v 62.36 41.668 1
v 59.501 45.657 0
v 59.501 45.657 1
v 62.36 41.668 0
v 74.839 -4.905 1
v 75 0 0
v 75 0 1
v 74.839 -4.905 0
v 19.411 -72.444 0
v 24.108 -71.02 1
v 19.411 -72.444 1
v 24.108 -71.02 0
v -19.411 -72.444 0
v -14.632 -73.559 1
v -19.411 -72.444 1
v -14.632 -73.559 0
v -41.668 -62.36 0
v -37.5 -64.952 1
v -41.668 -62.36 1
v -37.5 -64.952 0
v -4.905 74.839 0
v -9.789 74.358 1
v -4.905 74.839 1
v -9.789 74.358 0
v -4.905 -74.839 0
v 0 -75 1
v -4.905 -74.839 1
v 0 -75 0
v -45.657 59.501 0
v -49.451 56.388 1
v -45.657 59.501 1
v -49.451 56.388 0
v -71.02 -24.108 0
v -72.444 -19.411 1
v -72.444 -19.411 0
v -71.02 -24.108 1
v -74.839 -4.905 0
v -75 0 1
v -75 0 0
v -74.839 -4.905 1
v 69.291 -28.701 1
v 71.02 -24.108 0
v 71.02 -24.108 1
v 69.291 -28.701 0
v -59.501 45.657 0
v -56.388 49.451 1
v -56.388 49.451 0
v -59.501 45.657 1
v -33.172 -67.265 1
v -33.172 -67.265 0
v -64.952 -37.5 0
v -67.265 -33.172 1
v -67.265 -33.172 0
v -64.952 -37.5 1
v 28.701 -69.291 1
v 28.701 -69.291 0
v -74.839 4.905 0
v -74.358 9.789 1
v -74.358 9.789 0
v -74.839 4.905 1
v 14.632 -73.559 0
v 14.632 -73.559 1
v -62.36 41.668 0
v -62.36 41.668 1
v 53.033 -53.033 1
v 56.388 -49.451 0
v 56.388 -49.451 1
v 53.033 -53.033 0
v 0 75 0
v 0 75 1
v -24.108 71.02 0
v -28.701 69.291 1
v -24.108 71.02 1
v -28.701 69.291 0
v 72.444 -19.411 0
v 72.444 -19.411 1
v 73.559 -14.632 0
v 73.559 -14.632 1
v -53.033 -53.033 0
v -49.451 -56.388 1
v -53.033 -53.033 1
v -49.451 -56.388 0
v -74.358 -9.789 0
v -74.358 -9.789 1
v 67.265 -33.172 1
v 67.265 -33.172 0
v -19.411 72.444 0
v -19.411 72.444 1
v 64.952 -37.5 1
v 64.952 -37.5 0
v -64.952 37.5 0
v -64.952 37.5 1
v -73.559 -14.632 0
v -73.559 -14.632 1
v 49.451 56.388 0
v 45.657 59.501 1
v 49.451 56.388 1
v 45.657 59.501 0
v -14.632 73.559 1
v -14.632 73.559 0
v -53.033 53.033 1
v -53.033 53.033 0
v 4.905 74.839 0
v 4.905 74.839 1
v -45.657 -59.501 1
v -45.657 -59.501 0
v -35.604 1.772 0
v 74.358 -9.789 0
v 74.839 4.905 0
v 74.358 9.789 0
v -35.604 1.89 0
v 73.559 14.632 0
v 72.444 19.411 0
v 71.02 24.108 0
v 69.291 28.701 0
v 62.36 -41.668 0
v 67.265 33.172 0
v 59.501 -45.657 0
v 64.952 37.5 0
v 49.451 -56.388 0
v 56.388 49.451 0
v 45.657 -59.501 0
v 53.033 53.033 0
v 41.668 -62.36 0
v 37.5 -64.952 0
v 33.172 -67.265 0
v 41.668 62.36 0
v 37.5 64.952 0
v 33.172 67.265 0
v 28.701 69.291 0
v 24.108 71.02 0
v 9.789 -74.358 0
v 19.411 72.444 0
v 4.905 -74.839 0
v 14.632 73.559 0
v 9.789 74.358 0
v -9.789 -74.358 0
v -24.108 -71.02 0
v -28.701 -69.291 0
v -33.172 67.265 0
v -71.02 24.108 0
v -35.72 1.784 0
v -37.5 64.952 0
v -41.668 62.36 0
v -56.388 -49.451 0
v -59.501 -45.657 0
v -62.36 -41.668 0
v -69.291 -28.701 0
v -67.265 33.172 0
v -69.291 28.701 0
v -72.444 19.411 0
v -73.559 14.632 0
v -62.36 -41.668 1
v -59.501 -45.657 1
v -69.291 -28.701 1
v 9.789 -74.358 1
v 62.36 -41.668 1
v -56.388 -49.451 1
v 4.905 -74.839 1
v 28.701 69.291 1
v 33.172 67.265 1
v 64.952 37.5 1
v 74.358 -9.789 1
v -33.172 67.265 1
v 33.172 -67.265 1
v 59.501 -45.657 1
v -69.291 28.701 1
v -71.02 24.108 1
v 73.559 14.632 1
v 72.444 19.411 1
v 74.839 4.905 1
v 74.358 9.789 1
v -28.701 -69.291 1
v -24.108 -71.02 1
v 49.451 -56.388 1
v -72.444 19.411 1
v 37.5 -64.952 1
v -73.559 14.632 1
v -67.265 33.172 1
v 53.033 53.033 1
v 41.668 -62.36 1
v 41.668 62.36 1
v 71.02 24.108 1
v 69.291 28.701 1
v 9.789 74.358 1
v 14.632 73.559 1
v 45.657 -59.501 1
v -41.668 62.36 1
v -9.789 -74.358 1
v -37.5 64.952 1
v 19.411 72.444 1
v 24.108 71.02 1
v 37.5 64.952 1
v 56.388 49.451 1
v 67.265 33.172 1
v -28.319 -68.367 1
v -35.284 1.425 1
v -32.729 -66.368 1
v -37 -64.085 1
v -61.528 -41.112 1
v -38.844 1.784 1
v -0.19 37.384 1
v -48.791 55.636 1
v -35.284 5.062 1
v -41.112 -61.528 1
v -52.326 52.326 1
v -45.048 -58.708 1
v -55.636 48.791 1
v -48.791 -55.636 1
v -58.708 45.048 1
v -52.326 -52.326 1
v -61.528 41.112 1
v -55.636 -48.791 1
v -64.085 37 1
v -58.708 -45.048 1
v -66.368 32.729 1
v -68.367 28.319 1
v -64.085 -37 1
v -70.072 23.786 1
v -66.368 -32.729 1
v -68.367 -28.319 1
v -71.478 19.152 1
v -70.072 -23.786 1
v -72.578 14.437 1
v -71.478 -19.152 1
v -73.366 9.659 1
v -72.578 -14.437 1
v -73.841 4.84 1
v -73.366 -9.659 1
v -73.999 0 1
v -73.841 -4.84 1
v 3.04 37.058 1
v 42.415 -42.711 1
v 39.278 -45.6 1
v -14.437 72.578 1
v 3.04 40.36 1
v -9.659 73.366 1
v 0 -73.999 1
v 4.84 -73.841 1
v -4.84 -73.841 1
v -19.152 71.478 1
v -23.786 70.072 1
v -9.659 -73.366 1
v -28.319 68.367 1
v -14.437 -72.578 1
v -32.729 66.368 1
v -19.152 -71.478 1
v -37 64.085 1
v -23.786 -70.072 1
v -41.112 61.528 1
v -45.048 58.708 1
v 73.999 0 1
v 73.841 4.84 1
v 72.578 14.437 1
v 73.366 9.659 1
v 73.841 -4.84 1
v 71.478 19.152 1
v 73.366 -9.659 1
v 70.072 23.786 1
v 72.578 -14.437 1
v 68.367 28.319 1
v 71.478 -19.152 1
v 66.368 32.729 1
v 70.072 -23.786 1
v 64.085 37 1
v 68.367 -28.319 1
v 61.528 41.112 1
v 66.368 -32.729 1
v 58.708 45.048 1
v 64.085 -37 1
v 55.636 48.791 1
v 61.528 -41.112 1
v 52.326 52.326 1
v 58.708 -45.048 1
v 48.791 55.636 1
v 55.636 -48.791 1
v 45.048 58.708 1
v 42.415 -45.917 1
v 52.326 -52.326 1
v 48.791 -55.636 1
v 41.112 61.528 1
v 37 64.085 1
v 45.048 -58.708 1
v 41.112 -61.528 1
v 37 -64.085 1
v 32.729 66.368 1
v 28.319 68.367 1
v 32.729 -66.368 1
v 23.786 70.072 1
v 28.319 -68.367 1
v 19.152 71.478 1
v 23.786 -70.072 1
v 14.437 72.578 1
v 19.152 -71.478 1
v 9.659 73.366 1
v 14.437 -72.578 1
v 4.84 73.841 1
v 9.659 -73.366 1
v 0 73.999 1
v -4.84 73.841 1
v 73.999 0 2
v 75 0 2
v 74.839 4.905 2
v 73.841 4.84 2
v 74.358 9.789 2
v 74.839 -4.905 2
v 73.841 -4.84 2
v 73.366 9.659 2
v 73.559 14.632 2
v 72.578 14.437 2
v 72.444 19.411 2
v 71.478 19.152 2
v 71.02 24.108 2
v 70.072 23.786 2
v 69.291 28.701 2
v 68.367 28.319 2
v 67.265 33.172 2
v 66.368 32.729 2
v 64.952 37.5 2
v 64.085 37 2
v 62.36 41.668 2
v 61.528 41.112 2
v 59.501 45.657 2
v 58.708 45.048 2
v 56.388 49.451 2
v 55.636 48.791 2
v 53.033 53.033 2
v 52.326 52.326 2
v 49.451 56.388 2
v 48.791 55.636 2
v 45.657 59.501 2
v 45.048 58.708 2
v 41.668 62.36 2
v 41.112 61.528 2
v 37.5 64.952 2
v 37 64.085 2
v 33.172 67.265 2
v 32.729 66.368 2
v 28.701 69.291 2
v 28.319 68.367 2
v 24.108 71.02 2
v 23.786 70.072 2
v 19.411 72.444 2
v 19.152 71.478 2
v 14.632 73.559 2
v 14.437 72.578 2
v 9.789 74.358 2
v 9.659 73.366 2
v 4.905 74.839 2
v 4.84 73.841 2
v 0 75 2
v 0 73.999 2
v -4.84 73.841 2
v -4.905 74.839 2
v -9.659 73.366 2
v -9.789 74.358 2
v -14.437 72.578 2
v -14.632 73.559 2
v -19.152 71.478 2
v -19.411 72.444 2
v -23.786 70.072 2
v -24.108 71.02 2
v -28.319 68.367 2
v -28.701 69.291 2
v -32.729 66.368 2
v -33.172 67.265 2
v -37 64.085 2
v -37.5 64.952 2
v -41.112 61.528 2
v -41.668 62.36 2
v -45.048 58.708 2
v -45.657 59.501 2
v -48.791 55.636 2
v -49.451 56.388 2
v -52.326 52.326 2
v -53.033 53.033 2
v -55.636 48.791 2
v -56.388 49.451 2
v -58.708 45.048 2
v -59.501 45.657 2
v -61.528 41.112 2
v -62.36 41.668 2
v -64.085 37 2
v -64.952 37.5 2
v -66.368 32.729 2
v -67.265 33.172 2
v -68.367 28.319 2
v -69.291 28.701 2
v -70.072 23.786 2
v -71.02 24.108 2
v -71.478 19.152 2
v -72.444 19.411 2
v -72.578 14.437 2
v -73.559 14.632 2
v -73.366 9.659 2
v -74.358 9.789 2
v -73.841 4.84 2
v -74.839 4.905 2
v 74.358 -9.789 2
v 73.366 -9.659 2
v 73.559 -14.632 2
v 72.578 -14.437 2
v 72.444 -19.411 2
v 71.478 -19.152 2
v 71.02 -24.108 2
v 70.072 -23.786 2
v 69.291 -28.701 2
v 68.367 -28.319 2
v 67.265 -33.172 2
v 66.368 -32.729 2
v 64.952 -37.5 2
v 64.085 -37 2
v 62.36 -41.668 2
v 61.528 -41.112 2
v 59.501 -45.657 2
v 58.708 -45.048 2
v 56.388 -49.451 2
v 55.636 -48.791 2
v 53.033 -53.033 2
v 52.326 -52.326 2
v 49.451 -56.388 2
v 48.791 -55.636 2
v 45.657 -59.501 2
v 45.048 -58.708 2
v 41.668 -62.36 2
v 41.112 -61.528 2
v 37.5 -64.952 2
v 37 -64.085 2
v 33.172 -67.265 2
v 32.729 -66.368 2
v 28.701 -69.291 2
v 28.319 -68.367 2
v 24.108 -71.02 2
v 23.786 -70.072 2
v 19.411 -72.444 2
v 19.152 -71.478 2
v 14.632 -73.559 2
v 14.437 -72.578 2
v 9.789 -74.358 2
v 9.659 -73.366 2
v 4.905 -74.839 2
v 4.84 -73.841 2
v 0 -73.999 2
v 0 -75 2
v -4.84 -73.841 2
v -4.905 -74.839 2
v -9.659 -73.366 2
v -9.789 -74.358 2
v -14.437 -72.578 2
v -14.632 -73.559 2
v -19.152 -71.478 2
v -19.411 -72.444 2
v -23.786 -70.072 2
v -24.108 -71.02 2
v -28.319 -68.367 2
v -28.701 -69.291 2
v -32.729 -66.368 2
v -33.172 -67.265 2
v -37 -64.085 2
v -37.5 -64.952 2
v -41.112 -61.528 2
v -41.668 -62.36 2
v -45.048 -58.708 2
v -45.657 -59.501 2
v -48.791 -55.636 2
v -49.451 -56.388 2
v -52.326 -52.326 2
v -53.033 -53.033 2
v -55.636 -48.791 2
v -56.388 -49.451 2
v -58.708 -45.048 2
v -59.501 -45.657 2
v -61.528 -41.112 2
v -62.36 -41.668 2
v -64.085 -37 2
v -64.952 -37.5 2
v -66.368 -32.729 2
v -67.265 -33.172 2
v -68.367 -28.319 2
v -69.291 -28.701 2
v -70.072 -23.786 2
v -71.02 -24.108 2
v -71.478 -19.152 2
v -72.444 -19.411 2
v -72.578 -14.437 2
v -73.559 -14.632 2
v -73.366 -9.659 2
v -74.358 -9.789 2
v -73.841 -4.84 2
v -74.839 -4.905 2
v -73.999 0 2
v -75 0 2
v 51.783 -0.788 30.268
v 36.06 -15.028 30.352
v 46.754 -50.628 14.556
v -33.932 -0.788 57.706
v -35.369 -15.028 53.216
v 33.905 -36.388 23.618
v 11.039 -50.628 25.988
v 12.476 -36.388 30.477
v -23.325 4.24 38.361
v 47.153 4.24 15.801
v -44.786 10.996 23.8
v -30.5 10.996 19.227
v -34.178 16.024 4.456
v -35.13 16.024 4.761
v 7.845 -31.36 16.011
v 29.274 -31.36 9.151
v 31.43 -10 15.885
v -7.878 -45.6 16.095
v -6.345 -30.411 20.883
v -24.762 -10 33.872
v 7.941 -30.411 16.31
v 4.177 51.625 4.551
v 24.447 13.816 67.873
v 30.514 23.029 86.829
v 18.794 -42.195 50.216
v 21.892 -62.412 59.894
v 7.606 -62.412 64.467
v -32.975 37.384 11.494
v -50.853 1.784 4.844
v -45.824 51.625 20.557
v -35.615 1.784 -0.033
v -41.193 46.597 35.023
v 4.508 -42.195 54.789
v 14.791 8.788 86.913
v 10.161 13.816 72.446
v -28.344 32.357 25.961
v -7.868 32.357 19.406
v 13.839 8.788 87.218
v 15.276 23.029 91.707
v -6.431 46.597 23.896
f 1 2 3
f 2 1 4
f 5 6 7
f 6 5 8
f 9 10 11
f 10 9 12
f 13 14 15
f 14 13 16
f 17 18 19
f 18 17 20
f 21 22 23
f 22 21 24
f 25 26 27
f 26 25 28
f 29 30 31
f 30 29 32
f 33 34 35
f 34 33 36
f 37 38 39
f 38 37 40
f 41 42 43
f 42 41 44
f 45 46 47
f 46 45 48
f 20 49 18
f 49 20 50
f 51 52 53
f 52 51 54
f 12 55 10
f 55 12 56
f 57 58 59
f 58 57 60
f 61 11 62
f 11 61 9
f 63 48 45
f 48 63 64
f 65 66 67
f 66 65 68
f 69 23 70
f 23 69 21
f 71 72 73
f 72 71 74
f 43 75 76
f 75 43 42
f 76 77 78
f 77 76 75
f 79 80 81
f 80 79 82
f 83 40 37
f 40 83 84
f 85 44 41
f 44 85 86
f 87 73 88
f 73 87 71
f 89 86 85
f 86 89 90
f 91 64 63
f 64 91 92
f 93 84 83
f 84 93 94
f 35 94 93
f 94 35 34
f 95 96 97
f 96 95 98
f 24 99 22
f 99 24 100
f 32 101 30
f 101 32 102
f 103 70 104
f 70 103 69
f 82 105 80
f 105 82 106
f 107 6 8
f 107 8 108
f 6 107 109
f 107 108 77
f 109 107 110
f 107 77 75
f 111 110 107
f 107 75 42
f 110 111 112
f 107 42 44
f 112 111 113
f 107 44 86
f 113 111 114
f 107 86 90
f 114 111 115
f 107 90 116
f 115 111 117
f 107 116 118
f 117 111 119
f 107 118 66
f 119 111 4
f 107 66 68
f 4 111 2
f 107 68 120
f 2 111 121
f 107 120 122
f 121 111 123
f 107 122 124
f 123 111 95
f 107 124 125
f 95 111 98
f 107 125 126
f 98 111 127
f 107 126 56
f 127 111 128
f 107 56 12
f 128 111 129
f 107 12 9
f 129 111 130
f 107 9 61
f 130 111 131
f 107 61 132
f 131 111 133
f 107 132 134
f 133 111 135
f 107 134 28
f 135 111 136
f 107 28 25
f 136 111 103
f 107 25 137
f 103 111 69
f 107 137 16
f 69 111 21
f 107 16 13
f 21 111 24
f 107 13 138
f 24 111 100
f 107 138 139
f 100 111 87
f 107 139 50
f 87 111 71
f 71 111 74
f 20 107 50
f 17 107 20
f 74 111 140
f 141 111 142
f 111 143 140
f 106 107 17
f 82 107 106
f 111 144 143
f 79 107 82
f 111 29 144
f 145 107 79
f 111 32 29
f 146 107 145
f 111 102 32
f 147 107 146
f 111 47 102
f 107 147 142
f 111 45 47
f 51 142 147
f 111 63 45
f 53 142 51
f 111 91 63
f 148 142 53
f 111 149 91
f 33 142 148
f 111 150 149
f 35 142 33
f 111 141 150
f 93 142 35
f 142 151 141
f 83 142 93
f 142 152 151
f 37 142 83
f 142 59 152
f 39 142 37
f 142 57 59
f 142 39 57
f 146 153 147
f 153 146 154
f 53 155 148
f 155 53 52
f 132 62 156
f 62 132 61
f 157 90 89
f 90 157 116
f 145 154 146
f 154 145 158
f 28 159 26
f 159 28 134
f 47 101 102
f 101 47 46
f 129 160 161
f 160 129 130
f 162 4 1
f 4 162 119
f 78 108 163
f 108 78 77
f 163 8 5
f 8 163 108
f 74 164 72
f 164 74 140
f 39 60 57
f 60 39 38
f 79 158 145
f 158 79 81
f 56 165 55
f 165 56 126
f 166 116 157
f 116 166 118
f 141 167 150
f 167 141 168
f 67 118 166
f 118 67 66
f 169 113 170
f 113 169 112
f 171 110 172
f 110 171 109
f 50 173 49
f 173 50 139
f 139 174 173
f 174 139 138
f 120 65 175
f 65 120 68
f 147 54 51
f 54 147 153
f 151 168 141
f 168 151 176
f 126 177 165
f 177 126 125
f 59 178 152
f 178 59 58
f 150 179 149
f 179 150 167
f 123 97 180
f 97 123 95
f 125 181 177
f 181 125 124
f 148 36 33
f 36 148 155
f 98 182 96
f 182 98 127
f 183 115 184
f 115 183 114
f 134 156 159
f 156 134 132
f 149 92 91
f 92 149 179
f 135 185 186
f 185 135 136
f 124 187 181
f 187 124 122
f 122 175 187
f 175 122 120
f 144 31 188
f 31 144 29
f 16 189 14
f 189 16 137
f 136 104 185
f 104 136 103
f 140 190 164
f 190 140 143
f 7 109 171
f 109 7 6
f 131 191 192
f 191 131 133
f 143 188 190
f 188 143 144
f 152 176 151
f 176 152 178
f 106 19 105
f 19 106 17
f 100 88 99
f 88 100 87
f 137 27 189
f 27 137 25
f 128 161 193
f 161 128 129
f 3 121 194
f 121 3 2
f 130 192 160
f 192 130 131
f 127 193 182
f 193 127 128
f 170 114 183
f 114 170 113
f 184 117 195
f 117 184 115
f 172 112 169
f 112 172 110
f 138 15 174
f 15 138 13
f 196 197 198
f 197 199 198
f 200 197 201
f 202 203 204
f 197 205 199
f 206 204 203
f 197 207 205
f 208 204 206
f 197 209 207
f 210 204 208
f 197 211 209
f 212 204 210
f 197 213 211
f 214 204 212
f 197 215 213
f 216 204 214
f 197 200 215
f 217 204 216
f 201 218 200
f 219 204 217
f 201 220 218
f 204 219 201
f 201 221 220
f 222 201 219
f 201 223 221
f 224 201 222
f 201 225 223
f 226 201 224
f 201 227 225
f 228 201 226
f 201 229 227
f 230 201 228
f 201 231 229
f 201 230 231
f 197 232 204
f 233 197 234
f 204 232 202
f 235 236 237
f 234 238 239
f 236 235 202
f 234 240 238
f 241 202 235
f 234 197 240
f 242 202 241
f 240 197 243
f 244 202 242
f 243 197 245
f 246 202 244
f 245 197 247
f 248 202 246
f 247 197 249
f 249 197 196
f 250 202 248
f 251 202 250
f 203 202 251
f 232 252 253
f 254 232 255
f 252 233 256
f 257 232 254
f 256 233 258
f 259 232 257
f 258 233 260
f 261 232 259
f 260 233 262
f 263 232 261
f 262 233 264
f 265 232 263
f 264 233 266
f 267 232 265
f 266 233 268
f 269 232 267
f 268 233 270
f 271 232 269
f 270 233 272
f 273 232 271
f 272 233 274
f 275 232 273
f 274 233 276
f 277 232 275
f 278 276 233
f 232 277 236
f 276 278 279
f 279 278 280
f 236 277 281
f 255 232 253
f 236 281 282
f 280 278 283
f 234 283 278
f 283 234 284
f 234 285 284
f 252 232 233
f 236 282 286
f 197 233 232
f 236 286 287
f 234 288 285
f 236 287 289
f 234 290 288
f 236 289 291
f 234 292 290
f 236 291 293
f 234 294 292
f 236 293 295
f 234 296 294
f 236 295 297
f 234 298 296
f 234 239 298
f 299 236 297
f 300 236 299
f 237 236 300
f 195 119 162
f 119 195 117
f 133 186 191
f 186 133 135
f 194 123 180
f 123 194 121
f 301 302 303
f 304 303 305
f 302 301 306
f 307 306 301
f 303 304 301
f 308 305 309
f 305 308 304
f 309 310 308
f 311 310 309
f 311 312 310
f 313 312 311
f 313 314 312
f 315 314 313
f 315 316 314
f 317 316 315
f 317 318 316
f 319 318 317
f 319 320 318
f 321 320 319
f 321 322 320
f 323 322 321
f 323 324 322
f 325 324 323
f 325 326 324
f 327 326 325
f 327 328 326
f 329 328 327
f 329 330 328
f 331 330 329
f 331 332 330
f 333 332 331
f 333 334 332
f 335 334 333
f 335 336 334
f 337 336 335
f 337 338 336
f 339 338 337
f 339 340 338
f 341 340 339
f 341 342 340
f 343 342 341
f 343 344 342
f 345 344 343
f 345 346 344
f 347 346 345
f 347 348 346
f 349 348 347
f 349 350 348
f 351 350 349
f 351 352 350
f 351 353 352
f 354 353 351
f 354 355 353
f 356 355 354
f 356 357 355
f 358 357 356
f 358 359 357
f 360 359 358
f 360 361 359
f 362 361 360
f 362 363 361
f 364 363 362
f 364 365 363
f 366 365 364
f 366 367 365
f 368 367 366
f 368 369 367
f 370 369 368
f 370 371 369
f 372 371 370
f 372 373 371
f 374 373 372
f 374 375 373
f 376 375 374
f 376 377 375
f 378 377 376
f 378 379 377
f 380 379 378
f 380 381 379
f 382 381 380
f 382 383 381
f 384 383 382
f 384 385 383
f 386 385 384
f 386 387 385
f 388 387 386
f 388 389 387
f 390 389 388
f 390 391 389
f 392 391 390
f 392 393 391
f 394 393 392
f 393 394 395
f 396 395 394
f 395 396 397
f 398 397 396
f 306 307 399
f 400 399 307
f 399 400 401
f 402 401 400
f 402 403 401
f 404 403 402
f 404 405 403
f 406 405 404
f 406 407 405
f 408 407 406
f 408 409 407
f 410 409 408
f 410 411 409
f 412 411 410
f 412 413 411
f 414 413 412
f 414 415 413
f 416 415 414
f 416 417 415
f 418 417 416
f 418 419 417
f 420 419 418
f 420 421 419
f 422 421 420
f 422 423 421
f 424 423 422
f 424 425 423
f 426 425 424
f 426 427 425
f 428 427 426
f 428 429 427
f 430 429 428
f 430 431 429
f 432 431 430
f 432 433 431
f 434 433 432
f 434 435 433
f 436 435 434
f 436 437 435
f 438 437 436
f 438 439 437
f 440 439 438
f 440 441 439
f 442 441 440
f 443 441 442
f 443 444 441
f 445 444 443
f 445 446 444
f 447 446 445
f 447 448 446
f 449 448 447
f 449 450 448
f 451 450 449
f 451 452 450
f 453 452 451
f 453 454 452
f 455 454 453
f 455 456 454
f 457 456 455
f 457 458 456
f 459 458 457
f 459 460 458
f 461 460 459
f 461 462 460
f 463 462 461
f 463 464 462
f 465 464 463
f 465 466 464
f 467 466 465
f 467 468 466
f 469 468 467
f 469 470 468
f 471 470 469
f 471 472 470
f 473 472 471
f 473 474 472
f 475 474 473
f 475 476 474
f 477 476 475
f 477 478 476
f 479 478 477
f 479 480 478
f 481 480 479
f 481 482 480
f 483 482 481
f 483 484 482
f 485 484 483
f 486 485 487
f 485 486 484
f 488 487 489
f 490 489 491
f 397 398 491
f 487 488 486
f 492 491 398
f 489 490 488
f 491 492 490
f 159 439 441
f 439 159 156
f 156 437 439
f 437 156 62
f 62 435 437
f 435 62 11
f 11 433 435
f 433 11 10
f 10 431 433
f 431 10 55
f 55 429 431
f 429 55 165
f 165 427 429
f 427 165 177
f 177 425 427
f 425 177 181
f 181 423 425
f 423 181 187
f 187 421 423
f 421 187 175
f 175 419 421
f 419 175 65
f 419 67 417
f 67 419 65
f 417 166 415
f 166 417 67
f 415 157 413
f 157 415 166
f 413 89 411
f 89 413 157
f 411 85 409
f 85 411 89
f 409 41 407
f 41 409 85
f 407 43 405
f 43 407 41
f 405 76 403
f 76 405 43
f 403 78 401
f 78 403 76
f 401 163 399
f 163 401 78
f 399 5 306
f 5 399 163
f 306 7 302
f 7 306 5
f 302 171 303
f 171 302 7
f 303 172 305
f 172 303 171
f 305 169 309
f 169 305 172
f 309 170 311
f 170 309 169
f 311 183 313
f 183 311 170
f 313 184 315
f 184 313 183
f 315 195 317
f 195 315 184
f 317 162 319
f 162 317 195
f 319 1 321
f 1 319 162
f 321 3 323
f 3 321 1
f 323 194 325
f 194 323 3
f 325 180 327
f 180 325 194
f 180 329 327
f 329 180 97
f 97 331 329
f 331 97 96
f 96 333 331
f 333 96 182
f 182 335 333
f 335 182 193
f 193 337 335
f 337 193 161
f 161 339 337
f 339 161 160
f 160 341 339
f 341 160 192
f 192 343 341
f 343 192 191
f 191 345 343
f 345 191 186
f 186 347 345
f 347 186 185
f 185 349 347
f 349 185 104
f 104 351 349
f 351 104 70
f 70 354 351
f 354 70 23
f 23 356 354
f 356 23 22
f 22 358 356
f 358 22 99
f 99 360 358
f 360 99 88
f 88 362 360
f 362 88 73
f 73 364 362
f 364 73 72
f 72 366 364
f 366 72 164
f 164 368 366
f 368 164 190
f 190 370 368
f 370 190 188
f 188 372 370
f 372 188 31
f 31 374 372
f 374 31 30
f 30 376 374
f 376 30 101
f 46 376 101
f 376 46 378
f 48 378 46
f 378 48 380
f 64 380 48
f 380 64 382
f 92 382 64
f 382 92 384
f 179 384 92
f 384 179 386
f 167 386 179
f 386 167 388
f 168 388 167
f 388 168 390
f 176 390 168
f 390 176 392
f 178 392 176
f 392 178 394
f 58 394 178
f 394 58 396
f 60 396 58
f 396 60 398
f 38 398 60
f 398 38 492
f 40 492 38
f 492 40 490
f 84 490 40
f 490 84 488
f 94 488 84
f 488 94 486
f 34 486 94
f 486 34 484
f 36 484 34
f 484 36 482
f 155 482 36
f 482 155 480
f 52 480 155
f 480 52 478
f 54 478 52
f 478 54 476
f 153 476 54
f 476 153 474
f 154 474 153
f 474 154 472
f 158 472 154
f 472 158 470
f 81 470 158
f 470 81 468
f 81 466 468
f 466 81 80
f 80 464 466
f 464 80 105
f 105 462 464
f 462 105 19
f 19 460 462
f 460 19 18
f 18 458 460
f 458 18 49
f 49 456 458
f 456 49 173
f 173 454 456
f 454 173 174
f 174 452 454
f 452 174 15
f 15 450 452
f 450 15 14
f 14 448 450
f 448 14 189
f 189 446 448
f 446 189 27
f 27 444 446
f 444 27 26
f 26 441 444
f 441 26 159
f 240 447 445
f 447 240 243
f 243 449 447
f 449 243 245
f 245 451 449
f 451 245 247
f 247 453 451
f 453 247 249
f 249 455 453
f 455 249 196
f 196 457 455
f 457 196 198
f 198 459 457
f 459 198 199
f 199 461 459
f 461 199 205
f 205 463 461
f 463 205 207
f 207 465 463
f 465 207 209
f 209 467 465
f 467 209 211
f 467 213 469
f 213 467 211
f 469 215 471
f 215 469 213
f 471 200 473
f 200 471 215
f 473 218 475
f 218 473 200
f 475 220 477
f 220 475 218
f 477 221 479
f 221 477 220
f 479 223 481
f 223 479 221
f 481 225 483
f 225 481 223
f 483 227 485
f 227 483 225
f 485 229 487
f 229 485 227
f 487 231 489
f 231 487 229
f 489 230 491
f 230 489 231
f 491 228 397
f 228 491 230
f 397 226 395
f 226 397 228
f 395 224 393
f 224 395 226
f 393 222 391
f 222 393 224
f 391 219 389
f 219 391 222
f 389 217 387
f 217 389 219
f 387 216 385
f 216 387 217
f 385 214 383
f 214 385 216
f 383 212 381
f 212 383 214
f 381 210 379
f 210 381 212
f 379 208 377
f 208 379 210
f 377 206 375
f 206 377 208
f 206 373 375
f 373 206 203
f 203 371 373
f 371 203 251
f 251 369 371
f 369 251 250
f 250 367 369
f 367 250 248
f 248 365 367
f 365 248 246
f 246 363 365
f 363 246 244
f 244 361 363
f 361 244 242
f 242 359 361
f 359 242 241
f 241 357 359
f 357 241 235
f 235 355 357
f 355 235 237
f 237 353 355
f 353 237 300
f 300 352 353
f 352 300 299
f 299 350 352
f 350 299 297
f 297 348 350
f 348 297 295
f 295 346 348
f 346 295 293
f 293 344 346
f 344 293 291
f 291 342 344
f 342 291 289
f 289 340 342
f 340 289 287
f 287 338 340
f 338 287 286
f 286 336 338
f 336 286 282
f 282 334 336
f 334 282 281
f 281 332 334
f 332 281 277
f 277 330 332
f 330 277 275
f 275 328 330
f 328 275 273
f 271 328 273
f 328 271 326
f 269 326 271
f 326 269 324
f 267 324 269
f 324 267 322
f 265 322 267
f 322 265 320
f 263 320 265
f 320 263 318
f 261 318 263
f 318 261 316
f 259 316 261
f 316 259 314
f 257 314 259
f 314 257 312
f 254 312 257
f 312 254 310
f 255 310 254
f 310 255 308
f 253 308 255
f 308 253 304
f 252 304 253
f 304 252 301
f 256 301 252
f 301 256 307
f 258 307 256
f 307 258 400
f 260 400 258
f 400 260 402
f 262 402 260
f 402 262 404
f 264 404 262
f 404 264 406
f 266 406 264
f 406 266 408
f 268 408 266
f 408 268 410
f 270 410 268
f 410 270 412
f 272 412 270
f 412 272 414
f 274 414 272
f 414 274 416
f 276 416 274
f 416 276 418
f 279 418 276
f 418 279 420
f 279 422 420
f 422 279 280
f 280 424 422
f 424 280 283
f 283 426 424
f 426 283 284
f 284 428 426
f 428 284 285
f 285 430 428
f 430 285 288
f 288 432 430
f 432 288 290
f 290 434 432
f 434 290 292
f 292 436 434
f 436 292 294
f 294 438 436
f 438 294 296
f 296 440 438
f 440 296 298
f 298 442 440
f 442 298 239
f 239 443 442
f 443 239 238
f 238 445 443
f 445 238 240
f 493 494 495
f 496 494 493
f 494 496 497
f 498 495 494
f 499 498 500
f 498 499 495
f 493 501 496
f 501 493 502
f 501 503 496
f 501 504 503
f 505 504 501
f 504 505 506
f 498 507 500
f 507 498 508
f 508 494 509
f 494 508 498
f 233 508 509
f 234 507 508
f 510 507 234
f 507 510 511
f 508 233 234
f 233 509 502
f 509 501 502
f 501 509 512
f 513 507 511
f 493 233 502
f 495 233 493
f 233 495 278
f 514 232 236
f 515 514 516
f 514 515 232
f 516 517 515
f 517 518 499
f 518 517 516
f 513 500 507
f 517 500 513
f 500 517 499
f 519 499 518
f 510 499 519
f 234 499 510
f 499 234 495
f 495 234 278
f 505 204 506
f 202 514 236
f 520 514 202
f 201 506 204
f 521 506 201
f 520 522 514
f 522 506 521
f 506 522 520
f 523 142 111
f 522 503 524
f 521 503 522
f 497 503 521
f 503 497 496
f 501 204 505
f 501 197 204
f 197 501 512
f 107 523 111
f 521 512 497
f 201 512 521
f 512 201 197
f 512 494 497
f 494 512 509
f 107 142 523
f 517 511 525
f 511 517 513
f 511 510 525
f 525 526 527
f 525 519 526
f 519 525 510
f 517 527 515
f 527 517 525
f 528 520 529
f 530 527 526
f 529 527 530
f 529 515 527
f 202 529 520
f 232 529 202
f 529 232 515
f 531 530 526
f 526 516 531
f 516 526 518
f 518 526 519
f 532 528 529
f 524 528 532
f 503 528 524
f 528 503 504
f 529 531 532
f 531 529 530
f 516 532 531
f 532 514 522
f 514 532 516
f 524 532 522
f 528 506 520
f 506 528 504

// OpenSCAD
platform = "YES"; // [YES, NO]
cube_only = "YES";   // [YES, NO]

cargo_container_landmark();

module cargo_container_landmark() {
    cargo_width = 15;
    cargo_height = 16;
    cargo20ft_len = 37.5;
    cargo40ft_len = 75;
    edge = cargo_height / 40;

    if(platform == "YES") {
        color("black") 
            box_extrude(height = 2, shell_thickness = 1)  
                circle(75, $fn = 96);
        }
    
    color("red") 
        translate([-40, -10, 38.75]) 
            rotate([18.315, 17.75, 0])
                cargo_container_landmark0();


    module cargo_container(cargo_leng) {
        difference() {
            union() {
                cargo_container0(cargo_leng);
                translate([0, cargo_width / 2, cargo_height / 2]) rotate([0, 90, 0])
                 union() {
                    translate([0, cargo_width / 4.45, 0]) door();
                    translate([0, -cargo_width / 4.45, 0]) door();
                }
            }
            translate([cargo_leng / 2, cargo_width / 2, -cargo_height / 400]) linear_extrude(cargo_height / 80, scale = 0.95) square([cargo_leng * 0.975, cargo_width  * 0.9], center = true);
        }
    }

    module door() {
        difference() {
                linear_extrude(cargo_height / 40, scale = 0.95) square([cargo_height * 0.9, cargo_width * 0.425], center = true);
                
                translate([0, 0, ,-cargo_height / 400]) linear_extrude(cargo_height / 30, scale = 0.95) square([cargo_height * 0.045, cargo_width * 0.425 * 0.8], center = true);
                translate([cargo_height / 4.25, 0, ,-cargo_height / 400]) linear_extrude(cargo_height / 30, scale = 0.95) square([cargo_height * 0.045, cargo_width * 0.425 * 0.8], center = true);
                translate([-cargo_height / 4.25, 0, ,-cargo_height / 400]) linear_extrude(cargo_height / 30, scale = 0.95) square([cargo_height * 0.045, cargo_width * 0.425 * 0.8], center = true);        
            }
    }

    module cargo_container0(cargo_len) {
        d_offset = cargo_height / 400;
        railing_leng = cargo_len == cargo20ft_len ? 20 : 40;

        difference() {
            cube([cargo_len, cargo_width, cargo_height]);
            
            
       translate([-d_offset, cargo_width / 2, cargo_height / 2]) rotate([0, 90, 0]) linear_extrude(cargo_height / 40, scale = 0.95) square([cargo_height * 0.95, cargo_width * 0.95], center = true);


        translate([cargo_len + d_offset, cargo_width / 2, cargo_height / 2]) rotate([90, 0, -90]) railing(cargo_width);

        translate([cargo_len / 2, cargo_width / 2, cargo_height + d_offset]) rotate([180, 0, 0]) scale([1, 0.925, 1]) railing(railing_leng);


        translate([0, -d_offset, 0]) mirror([0, 1, 0]) translate([cargo_len / 2, 0, cargo_height / 2]) rotate([90, 0, 0]) railing(railing_leng);

        translate([cargo_len / 2, cargo_width + d_offset, cargo_height / 2]) rotate([90, 0, 0]) railing(railing_leng);
        }
    }

    module railing(length) {
        end = length == 20 ? 22 : (length == 40 ? 45 : 8);
        leng = length == 20 ? cargo20ft_len : (length == 40 ? cargo40ft_len : length);
        x_offset = length == 20 ? cargo_height / 30 : (length == 40 ? cargo_height / 80 : cargo_height / 30);
        
        points = [for(i = [0:end]) [i * (cargo_height / 10), 0]];
        translate([-leng / 2 + cargo_height / 10 - x_offset , 0, 0]) along_with(points) 
            rotate([-90, 90, 0]) linear_extrude(cargo_height / 40, scale = [0.7, 0.9]) 
                square([cargo_height / 20, cargo_height - edge], center = true);
    }

    module cargo20ft() {
        if(cube_only == "NO") {
            cargo_container(cargo20ft_len);
        }
        else {
            cube([cargo20ft_len, cargo_width, cargo_height]);
        }
    }

    module cargo40ft() {
        if(cube_only == "NO") {
            cargo_container(cargo40ft_len);
        }
        else {
            cube([cargo40ft_len, cargo_width, cargo_height]);
        }
    }




    module cargo_container_landmark0() {
        union() {
            union() {
                translate([cargo40ft_len + cargo_width, cargo_width - cargo20ft_len, 0]) 
                    rotate(90) 
                        cargo20ft();
                translate([cargo20ft_len + cargo_width, -cargo20ft_len, 0]) 
                    cargo20ft();
            }

            union() {
                translate([cargo_width + cargo20ft_len, -cargo40ft_len + cargo20ft_len, cargo40ft_len - cargo20ft_len])  
                    rotate(90) 
                        cargoL1();
            }

            translate([cargo_width, cargo20ft_len, -cargo20ft_len]) 
                cargoL2();

            union() {
                cargoL1();
                translate([cargo_width, cargo_width, -cargo20ft_len]) 
                    rotate([0, 0, 90]) 
                        cargo20ft();
            }
        }
    }

    module cargoL1() {
        union() {
            translate([cargo_height, 0, -cargo20ft_len]) 
                rotate([0, -90, 0]) 
                    cargo20ft();
            cargo40ft();
        }
    }


    module cargoL2() {
        union() {
            translate([cargo20ft_len, 0, cargo_height]) 
                rotate([0, -90, 0]) 
                    cargo40ft();
            cargo20ft();
        }
    }
 
}




    
/**
 * The dotSCAD library
 * @copyright Justin Lin, 2017
 * @license https://opensource.org/licenses/lgpl-3.0.html
 *
 * @see https://github.com/JustinSDK/dotSCAD
*/

function __is_vector(value) = !(value >= "") && len(value) != undef;

function __angy_angz(p1, p2) = 
    let(
        dx = p2[0] - p1[0],
        dy = p2[1] - p1[1],
        dz = p2[2] - p1[2],
        ya = atan2(dz, sqrt(pow(dx, 2) + pow(dy, 2))),
        za = atan2(dy, dx)
    ) [ya, za];

/**
* along_with.scad
*
* Puts children along the given path. If there's only one child, 
* it will put the child for each point. 
* 
* @copyright Justin Lin, 2017
* @license https://opensource.org/licenses/lgpl-3.0.html
*
* @see https://openhome.cc/eGossip/OpenSCAD/lib-along_with.html
*
**/ 


module along_with(points, angles, twist = 0, scale = 1.0) {
    leng_points = len(points);
    leng_points_minus_one = leng_points - 1;
    twist_step_a = twist / leng_points;
        
    function scale_step() =
        let(s =  (scale - 1) / leng_points_minus_one)
        [s, s, s];

    scale_step_vt = __is_vector(scale) ? 
        [
            (scale[0] - 1) / leng_points_minus_one, 
            (scale[1] - 1) / leng_points_minus_one,
            scale[2] == undef ? 0 : (scale[2] - 1) / leng_points_minus_one
        ] : scale_step(); 
    
    end_i = $children == 1 ? leng_points_minus_one : $children - 1;

    function _path_angles(pts, i = 0) = 
        i == end_i ?
                [] : 
                concat(
                    [__angy_angz(pts[i], pts[i + 1])], 
                    _path_angles(pts, i + 1)
                );
            
    function path_angles() = 
       let(
           pts = len(points[0]) == 3 ? points : [for(pt = points) __to3d(pt)],
           angs = _path_angles(pts)
        )
       concat(
           [[0, -angs[0][0], angs[0][1]]], 
           [for(a = angs) [0, -a[0], a[1]]]
       );
       
    angles_defined = angles != undef;
    angs = angles_defined ? angles : path_angles(points);

    module align(i) {
        translate(points[i]) 
            rotate(angs[i])
                rotate(angles_defined ? [0, 0, 0] : [90, 0, -90])
                    rotate(twist_step_a * i) 
                         scale([1, 1, 1] + scale_step_vt * i) 
                             children(0);
    }

    if($children == 1) { 
        for(i = [0:leng_points_minus_one]) {
            align(i) children(0);
        }
    } else {
        for(i = [0:min(leng_points, $children) - 1]) {
            align(i) children(i);
        }
    }

    // hook for testing
    test_along_with_angles(angs);
}

module test_along_with_angles(angles) {
    
}

function __to3d(p) = [p[0], p[1], 0];

/**
* box_extrude.scad
*
* Creates a box (container) from a 2D object.
* 
* @copyright Justin Lin, 2017
* @license https://opensource.org/licenses/lgpl-3.0.html
*
* @see https://openhome.cc/eGossip/OpenSCAD/lib-box_extrude.html
*
**/

module box_extrude(height, shell_thickness, offset_mode = "delta", chamfer = false) {
    linear_extrude(shell_thickness)
        children();
        
    linear_extrude(height) 
        difference() {
            children();
            if(offset_mode == "delta") {
                offset(delta = -shell_thickness, chamfer = chamfer) 
                    children(); 
            } else {
                offset(r = -shell_thickness) 
                    children(); 
            } 
        }    
}

    
